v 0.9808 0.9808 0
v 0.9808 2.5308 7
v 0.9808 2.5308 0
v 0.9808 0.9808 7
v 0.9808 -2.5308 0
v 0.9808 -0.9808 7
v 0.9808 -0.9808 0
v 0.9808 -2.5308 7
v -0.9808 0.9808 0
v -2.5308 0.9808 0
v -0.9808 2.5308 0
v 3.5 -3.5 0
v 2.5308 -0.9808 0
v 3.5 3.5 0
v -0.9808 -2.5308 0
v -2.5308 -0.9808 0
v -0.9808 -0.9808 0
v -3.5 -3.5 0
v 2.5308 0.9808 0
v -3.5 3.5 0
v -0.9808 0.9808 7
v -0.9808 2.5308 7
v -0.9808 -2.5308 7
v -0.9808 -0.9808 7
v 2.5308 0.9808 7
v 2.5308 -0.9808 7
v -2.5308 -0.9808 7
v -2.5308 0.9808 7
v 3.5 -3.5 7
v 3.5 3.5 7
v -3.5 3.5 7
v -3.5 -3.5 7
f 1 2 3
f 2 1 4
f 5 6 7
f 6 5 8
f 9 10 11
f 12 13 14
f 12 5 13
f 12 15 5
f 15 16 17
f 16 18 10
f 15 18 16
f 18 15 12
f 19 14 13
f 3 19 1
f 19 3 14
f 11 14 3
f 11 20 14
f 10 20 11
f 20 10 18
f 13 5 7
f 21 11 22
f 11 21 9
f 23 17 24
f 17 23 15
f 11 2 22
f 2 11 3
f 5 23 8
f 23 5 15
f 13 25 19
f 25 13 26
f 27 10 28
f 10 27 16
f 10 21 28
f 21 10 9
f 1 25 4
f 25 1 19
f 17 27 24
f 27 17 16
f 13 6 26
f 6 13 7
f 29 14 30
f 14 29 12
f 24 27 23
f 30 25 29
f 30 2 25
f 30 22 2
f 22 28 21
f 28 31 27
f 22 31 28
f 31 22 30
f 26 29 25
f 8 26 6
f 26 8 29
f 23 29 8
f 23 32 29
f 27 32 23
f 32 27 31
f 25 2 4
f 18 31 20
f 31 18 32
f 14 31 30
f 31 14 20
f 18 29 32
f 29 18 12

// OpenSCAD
// file: lego/lego.scad
$fn = 100;
u = 1.6; // One lego unit
play = 0.226*u; // Tolerance of holes
studr = 3*0.5*u; // Radius of stud/pin
beamh = 5*u;
beamw = 5*u;

ZEROISH = 0.000000000000001;

// Body of lego beam without holes
module beambody(length){
	translate([0, 0, beamh/2])
	minkowski() {
		cube([ZEROISH,
				length*5*u - beamw,
				beamh],
			center = true);
		cylinder(ZEROISH, beamw/2, beamw/2);
	}
}

// Cutouts for stud/pin holes in beams
module studhole(length=1){
	r = studr+play/2;
	R = 3.5*0.5*u;
	cylinder(beamh*u, r, r);
	for (i = [0, beamh-0.5*u]) {
		translate([0,0,i]) cylinder(0.5*u, R, R);
	}
}


// Beam with holes
module beam(length) {
	difference(){
		translate([0, length*5*u/2, 0])
			beambody(length);
		for (i = [0 : length-1]) {
			pos = (2.5 + 5*i) * u;
			translate([0, pos, 0]) studhole();
		}
	}
}

// L shaped beam
module lbeam(length=4, width=3) {
	translate([0, -4, 0]) beam(length);
	rotate([0, 0, 90]) translate([0, -4, 0]) beam(width);
}

// Axle
module axle(length=2, hole=false) {
	if (hole) {
		translate([0, 0, length*beamw/2]) {
			cube([u + play, 4.7 + play, length*beamw], center=true);
			cube([4.7 + play, u + play, length*beamw], center=true);
		}
	}
	else {
		translate([0, 0, length*beamw/2]) {
			cube([u, 4.7, length*beamw], center=true);
			cube([4.7, u, length*beamw], center=true);
		}
	}
}

// Cutout for axle holes
module axlehole(length) {
	axle(length, true);
}

difference(){
translate([0,0,3.5]) cube(7,center=true);
axlehole(3);
}
// main file
include <lego/lego.scad>;

// Arm bracket is the part of motormount that the arm screws into
module armbracket(){
	difference(){
		translate([-1.5*beamw, 0, 0]) cube([3*beamw, beamw, beamh]);
		translate([5, 2.5, 0]*u) studhole();
		translate([0, 2.5, 0]*u) studhole();
		translate([-5, 2.5, 0]*u) studhole();
	}
}


// Motor bracket is the part of motormount that motor screws into
module motorbracket(inner=12, outer=19, screwdia=3){

	// Screwholes
	module screwhole(dia, length){
		cylinder (length, dia*1.1/2, dia*1.1/2);
	}

	thickness = 3;
	r = (outer/2 + screwdia)*1.05;
	translate([0, r-2, 0])
	difference(){

		// Main body of motor bracket
		cylinder(thickness, r, r);

		// Motor mounting slots
		for (d = [0 : 90 : 360]){
			rotate ([0, 0, d+45])
			hull(){
				translate ([inner/2, 0, 0])
					screwhole(screwdia, thickness);
				translate ([outer/2, 0, 0])
					screwhole(screwdia, thickness);
			}
		}

		// Cutoff for arm mount
		translate([-r, -r, 0])
			cube([r*2, 2, thickness]);

	}
}

// Motor mount is the whole part. This is the one that should be printed
module motormount(){
	motorbracket();

	rotate([90, 0, 90])
		translate([-beamw*1.5, 0, -beamw/2])
		armbracket();
}
